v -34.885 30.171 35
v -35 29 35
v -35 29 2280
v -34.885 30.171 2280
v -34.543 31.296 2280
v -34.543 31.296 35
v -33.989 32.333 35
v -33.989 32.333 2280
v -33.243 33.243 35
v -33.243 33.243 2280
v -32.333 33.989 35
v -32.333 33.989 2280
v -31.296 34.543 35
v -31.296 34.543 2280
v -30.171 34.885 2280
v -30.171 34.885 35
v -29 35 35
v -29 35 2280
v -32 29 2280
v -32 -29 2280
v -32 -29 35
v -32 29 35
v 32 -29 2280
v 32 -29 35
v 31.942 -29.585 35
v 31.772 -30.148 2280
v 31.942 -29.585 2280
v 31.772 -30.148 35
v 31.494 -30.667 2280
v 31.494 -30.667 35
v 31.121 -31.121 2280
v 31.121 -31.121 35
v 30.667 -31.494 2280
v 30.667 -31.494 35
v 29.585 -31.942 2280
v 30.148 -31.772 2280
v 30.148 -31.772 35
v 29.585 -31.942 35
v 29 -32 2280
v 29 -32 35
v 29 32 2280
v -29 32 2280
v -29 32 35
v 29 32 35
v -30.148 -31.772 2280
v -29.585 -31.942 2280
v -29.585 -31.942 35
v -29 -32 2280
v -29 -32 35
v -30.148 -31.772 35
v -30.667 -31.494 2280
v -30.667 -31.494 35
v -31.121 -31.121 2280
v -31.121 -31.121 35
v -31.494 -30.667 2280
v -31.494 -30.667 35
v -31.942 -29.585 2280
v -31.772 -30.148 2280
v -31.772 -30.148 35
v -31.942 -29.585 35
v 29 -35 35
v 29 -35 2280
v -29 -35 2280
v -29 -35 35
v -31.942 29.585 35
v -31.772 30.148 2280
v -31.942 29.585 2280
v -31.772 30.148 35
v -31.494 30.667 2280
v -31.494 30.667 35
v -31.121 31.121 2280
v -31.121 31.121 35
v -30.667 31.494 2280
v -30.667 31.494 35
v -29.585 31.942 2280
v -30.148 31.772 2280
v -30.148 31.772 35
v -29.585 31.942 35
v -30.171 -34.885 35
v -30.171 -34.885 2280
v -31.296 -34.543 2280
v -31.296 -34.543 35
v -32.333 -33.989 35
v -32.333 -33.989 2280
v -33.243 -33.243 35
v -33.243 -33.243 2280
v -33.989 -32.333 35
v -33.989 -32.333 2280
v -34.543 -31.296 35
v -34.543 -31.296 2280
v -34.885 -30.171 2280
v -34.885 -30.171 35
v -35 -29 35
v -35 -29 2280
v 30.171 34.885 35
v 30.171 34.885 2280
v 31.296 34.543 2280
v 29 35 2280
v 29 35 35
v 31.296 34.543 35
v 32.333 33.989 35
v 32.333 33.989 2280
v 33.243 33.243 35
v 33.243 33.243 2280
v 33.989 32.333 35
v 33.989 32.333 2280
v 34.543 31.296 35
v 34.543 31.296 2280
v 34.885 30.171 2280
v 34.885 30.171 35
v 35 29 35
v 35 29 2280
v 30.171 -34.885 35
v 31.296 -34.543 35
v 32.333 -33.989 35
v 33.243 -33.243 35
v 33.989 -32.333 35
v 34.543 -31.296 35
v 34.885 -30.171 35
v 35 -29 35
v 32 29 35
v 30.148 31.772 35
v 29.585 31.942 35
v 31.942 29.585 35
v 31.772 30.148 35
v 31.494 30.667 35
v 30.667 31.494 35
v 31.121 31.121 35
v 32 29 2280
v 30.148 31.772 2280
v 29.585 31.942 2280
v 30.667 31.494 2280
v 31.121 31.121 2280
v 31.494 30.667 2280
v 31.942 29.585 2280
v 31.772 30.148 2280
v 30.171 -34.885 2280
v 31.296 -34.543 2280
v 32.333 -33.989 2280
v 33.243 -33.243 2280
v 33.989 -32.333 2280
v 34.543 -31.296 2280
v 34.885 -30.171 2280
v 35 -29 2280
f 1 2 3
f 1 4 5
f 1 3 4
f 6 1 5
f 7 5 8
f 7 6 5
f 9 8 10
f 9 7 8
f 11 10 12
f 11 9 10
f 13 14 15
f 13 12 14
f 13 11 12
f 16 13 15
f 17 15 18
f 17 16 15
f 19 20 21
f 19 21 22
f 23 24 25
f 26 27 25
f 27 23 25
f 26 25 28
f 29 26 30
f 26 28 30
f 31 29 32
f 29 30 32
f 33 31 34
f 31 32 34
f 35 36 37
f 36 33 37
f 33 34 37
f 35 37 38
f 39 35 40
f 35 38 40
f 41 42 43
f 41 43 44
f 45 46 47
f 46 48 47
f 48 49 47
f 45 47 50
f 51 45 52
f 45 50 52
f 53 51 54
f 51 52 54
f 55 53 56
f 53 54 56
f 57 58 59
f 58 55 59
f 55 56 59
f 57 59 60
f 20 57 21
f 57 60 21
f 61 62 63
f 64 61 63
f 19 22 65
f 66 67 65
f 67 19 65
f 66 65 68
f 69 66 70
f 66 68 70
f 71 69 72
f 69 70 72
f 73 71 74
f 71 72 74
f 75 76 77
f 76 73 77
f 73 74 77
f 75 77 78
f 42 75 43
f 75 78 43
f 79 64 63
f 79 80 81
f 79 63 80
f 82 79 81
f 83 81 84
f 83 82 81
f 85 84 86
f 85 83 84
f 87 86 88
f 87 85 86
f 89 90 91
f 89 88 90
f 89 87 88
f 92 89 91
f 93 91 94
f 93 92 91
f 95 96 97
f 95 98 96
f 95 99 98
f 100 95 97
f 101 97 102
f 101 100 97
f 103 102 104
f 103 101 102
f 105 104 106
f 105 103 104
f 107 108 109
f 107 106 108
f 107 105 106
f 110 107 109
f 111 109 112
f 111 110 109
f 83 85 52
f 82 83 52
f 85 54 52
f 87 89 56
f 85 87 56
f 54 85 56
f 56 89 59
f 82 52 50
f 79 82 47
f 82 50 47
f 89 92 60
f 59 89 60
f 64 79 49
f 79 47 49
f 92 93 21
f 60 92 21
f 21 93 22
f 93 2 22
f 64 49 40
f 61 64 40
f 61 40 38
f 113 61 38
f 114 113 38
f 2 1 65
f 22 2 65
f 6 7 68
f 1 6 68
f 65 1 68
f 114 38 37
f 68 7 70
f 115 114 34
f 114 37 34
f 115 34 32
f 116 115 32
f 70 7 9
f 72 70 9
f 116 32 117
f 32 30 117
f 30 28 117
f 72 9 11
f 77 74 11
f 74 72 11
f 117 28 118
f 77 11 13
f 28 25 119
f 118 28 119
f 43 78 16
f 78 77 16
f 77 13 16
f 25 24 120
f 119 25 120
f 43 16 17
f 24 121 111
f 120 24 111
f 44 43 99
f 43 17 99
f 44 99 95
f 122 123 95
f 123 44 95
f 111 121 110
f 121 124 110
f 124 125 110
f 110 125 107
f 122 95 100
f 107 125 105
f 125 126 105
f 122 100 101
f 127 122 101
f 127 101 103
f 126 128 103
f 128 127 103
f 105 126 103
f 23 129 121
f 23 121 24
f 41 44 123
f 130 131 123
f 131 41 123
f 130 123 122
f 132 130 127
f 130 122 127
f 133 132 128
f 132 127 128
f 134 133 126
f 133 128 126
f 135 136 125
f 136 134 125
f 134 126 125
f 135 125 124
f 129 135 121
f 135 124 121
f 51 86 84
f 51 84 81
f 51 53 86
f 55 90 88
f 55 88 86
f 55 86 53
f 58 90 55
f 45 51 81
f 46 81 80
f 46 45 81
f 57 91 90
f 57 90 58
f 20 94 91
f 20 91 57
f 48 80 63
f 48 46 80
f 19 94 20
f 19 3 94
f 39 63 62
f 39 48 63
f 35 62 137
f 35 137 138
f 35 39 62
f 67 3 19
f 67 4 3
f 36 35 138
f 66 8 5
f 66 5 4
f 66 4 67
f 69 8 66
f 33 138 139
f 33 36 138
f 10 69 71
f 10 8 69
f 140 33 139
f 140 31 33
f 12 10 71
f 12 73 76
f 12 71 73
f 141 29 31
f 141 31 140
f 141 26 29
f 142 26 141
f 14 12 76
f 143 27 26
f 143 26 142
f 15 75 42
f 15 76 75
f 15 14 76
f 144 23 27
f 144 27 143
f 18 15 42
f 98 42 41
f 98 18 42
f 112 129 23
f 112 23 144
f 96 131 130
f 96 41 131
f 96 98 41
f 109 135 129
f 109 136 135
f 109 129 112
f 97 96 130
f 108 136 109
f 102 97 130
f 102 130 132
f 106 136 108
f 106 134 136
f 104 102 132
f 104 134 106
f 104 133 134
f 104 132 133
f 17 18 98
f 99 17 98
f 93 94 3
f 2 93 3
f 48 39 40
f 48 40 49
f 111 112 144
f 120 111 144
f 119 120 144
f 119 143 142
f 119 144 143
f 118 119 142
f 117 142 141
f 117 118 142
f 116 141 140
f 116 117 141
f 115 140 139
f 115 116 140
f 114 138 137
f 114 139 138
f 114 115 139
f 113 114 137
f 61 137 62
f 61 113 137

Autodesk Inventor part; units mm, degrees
ref_plane "Plano inicial" through (0, 0, 35) normal (0, 0, 1) x (1, 0, 0)
ref_plane "Plano final" through (0, 0, 2280) normal (0, 0, 1) x (1, 0, 0)
sketch "Boceto" plane through (0, 0, 0) normal (0, 0, 1) x (1, 0, 0)
  line L0 (-35, -29) -> (-35, 29)
  line L1 (-29, 35) -> (29, 35)
  line L2 (35, 29) -> (35, -29)
  line L3 (29, -35) -> (-29, -35)
  arc A0 (-35, -29) -> (-29, -35) centre (-29, -29) ccw
  arc A1 (35, 29) -> (29, 35) centre (29, 29) ccw
  arc A2 (-29, 35) -> (-35, 29) centre (-29, 29) ccw
  arc A3 (29, -35) -> (35, -29) centre (29, -29) ccw
  arc A4 (-29, 32) -> (-32, 29) centre (-29, 29) ccw
  line L4 (-29, 32) -> (29, 32)
  arc A5 (32, 29) -> (29, 32) centre (29, 29) ccw
  line L5 (32, 29) -> (32, -29)
  arc A6 (29, -32) -> (32, -29) centre (29, -29) ccw
  line L6 (29, -32) -> (-29, -32)
  arc A7 (-32, -29) -> (-29, -32) centre (-29, -29) ccw
  line L7 (-32, -29) -> (-32, 29)
  line L8 (0, 50.7397) -> (0, -50.7397) construction
  line L9 (-50.7397, 0) -> (50.7397, 0) construction
  dimension "d7" = 6
  dimension "d9" = 70
  dimension "d11" = 70
  dimension "d12" = 3
  dimension "d15" = 35
  dimension "d16" = 35
extrude "Cuerpo" add sketch "Boceto" along normal up to surface (2245 mm away) from surface at 35
sketch "Sketch3" plane through (0, 0, 0) normal (0, 0, 1) x (1, 0, 0)
  line L0 (0, 0) -> (10, 0)
ref_plane "Work Plane3" through (0, 0, 0) normal (0, -1, 0) x (1, 0, 0)
sketch "Sketch4" plane through (0, 0, 0) normal (0, -1, 0) x (1, 0, 0)
  line L0 (-2, 35) -> (12, 35)
  line L1 (-2, 2280) -> (12, 2280)
  dimension "d18" = 2245
ref_plane "Plano de trabajo4" through (500, 29, 2280) normal (0, 0, 1) x (1, 0, 0)
split "Dividir1" plane through (500, 29, 2280) removes the side toward (0, 0, 1)
ref_plane "Plano de trabajo5" through (1000, 29, 35) normal (0, 0, -1) x (-1, 0, 0)
split "Dividir2" plane through (1000, 29, 35) removes the side toward (0, 0, -1)
equation "\"d7\" = G_IR"
equation "\"d9\" = G_W"
equation "\"d11\" = G_H"
equation "\"d12\" = G_T"
equation "\"d15\" = 0.5 * d9"
equation "\"d16\" = 0.5 * d11"
equation "\"d3\" = G_L"
equation "\"G_W\" = 70"
equation "\"G_H\" = 70"
equation "\"G_T\" = 3"
equation "\"G_IR\" = 6"
equation "\"G_L\" = d18"
equation "\"G_OFFSET_START\" = -35"
equation "\"G_OFFSET_END\" = -35"
equation "\"d13\" = -G_OFFSET_START"
equation "\"B_L\" = 2315"
properties part number "ISO 10799-2 - 70x70x3 - 2245" material "Galvanizado catalogo 2"
